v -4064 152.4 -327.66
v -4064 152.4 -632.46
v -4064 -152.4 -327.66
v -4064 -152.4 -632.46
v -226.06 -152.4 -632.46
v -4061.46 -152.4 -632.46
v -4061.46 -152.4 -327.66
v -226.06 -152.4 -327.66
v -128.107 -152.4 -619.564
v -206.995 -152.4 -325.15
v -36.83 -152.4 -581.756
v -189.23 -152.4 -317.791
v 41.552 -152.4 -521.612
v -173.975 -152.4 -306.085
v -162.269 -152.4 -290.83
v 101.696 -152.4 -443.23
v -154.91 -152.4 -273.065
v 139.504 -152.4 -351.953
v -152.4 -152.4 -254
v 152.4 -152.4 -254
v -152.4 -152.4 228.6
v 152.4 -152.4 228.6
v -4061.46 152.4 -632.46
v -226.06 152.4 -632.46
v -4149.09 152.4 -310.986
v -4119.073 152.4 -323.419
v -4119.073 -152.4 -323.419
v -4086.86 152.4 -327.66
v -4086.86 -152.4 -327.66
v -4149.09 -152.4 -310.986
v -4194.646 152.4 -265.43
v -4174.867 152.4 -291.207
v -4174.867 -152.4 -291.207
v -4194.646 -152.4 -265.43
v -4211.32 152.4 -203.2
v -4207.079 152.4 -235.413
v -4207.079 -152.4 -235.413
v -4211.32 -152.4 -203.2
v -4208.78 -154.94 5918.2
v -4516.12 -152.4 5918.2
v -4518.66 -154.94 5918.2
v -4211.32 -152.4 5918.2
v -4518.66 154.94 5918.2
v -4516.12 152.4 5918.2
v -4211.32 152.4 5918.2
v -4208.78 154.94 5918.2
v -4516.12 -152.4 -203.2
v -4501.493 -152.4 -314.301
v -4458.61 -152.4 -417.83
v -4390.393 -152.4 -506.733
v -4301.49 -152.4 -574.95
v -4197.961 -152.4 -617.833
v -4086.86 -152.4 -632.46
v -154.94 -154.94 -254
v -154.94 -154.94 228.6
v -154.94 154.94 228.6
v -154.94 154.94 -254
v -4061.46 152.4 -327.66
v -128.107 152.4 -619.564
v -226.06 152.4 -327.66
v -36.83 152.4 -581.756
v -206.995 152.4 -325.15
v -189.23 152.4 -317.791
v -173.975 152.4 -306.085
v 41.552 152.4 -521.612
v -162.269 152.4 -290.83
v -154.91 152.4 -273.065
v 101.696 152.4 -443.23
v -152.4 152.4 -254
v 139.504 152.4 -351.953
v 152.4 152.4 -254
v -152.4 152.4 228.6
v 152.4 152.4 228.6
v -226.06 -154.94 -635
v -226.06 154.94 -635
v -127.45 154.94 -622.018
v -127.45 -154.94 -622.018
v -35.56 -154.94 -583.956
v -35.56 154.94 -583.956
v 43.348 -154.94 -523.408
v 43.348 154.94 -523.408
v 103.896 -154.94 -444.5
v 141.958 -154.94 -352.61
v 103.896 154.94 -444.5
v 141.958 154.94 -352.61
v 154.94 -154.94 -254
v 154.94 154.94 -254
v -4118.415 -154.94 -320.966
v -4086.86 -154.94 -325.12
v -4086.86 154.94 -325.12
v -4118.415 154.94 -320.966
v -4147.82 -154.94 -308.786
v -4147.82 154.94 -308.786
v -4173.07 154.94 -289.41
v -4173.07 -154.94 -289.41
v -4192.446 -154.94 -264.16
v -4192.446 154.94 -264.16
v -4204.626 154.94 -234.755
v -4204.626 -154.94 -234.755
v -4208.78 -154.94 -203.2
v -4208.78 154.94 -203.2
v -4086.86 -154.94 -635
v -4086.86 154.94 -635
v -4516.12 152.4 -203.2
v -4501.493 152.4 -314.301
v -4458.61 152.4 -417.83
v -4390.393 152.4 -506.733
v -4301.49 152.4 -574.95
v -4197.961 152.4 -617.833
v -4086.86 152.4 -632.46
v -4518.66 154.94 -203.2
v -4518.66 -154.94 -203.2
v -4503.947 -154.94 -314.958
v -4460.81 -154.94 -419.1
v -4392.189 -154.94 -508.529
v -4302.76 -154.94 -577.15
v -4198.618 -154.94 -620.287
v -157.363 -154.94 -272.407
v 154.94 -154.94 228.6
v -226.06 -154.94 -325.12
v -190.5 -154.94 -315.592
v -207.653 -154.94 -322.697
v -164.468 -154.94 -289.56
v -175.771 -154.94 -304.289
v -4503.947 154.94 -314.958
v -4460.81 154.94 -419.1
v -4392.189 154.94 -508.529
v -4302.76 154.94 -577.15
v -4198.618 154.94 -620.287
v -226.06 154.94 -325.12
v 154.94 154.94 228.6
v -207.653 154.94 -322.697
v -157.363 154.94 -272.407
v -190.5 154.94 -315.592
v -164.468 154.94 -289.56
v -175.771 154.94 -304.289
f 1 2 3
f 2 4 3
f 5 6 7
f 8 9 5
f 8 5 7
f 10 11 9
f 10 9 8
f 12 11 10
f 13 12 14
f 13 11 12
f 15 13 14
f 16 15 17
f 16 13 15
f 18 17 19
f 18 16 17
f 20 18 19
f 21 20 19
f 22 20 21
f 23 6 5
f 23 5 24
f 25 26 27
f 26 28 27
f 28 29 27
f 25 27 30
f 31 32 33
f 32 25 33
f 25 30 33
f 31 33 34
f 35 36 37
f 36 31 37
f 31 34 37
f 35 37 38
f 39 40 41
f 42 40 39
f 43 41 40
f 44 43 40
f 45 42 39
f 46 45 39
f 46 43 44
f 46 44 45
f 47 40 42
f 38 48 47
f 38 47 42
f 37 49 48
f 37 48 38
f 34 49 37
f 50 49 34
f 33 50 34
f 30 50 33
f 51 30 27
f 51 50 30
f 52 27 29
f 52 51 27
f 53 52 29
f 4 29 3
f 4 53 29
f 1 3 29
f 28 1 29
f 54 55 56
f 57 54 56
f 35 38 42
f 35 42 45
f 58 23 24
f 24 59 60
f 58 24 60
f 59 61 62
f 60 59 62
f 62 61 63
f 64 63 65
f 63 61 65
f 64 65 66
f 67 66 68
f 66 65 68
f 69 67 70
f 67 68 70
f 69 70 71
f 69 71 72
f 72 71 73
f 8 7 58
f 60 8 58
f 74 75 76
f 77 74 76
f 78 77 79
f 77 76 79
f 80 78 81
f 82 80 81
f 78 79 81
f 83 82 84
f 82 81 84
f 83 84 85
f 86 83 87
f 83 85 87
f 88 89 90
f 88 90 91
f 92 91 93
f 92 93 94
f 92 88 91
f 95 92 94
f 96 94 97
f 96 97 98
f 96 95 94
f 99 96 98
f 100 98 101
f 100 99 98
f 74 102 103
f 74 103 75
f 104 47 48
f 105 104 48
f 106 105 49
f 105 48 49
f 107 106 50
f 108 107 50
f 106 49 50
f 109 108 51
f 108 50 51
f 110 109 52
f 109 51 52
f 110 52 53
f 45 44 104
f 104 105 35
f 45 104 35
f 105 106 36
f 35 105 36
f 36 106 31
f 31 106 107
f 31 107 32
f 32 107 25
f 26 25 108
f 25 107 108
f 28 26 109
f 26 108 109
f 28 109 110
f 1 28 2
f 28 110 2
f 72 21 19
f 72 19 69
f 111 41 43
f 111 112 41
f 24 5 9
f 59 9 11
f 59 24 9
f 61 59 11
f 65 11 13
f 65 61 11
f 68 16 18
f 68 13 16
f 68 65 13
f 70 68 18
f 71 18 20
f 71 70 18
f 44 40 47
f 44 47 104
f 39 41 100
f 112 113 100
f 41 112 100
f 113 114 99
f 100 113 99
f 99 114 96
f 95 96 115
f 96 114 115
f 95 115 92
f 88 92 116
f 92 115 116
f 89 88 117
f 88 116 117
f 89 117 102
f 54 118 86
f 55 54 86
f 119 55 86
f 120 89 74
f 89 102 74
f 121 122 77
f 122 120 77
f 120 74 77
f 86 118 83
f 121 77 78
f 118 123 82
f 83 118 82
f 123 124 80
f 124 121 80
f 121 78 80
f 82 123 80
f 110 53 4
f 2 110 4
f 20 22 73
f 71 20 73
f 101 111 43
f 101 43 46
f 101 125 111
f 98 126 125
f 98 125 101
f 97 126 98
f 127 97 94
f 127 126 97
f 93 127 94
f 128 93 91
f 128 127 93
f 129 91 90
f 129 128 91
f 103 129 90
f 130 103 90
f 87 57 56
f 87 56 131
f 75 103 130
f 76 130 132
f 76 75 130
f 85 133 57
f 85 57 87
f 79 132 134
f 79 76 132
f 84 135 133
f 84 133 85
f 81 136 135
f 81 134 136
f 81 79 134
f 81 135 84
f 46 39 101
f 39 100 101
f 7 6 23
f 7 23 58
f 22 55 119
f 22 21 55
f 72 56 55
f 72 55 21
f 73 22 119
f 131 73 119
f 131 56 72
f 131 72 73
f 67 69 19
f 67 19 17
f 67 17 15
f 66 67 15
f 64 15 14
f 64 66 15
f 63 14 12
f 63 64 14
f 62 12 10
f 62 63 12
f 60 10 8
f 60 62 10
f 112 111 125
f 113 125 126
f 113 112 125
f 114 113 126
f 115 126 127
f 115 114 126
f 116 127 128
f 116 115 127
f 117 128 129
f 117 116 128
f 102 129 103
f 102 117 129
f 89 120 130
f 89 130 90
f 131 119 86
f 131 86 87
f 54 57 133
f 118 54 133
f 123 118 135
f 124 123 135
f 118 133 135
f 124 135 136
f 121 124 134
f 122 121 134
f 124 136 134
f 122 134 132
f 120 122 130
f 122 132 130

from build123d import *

# Parameters (mm, degrees)
SKETCH2_W            = 309.88
SKETCH2_H            = 309.88
SKETCH2_W_2          = 304.8
SKETCH2_H_2          = 304.8
BOSS_EXTRUDE1_DEPTH  = 228.6
BOSS_EXTRUDE6_DEPTH  = 309.88
SHELL1_T             = -2.54
SKETCH9_W            = 304.8
SKETCH9_H            = 304.8
CUT_EXTRUDE2_DEPTH   = 547.442497249
SKETCH10_W           = 309.88
SKETCH10_H           = 309.88
SKETCH10_W_2         = 304.8
SKETCH10_H_2         = 304.8
BOSS_EXTRUDE8_DEPTH  = 3810
BOSS_EXTRUDE9_DEPTH  = 309.88
SHELL2_T             = -2.54
SKETCH12_W           = 309.88
SKETCH12_H           = 309.88
SKETCH12_W_2         = 304.8
SKETCH12_H_2         = 304.8
BOSS_EXTRUDE10_DEPTH = 6096


with BuildPart() as part:
    # Sketch2 → Boss-Extrude1 (new, symmetric)
    with BuildSketch(Plane.XY):
        Rectangle(SKETCH2_W, SKETCH2_H)
        Rectangle(SKETCH2_W_2, SKETCH2_H_2, mode=Mode.SUBTRACT)
    extrude(amount=BOSS_EXTRUDE1_DEPTH, both=True)

    # Sketch8 → Boss-Extrude6 (add)
    with BuildSketch(Plane(origin=(0, 154.94, 0), x_dir=(1, 0, 0), z_dir=(0, 1, 0))):
        with BuildLine():
            Line((154.94, 228.6), (-154.94, 228.6))
            Line((-154.94, 228.6), (-154.94, 254))
            ThreePointArc((-154.94, 254), (-175.770565722, 304.289434278), (-226.06, 325.12))
            Line((-226.06, 325.12), (-251.46, 325.12))
            Line((-251.46, 325.12), (-251.46, 635))
            Line((-251.46, 635), (-226.06, 635))
            ThreePointArc((-226.06, 635), (43.347683632, 523.407683632), (154.94, 254))
            Line((154.94, 254), (154.94, 228.6))
        make_face()
    extrude(amount=-BOSS_EXTRUDE6_DEPTH)

    # Shell1
    shell1_openings = [part.faces().sort_by_distance(p)[0] for p in [
        (-251.46, 0, -480.06),
    ]]
    offset(amount=SHELL1_T, openings=shell1_openings, kind=Kind.INTERSECTION)

    # Sketch9 → Cut-Extrude2 (cut, through all)
    with BuildSketch(Plane(origin=(0, 0, -231.14), x_dir=(-1, 0, 0), z_dir=(0, 0, -1))):
        Rectangle(SKETCH9_W, SKETCH9_H)
    extrude(amount=-CUT_EXTRUDE2_DEPTH, mode=Mode.SUBTRACT)

    # Sketch10 → Boss-Extrude8 (add)
    with BuildSketch(Plane.ZY.offset(251.46)):
        with Locations((-480.06, 0)):
            Rectangle(SKETCH10_W, SKETCH10_H)
        with Locations((-480.06, 0)):
            Rectangle(SKETCH10_W_2, SKETCH10_H_2, mode=Mode.SUBTRACT)
    extrude(amount=BOSS_EXTRUDE8_DEPTH)

    # Sketch11 → Boss-Extrude9 (add)
    with BuildSketch(Plane.XZ.offset(154.94)):
        with BuildLine():
            Line((-4061.46, -325.12), (-4086.86, -325.12))
            ThreePointArc((-4086.86, -325.12), (-4173.070458762, -289.410458762), (-4208.78, -203.2))
            Line((-4208.78, -203.2), (-4208.78, -177.8))
            Line((-4208.78, -177.8), (-4518.66, -177.8))
            Line((-4518.66, -177.8), (-4518.66, -203.2))
            ThreePointArc((-4518.66, -203.2), (-4392.188708116, -508.528708116), (-4086.86, -635))
            Line((-4086.86, -635), (-4061.46, -635))
            Line((-4061.46, -635), (-4061.46, -325.12))
        make_face()
    extrude(amount=-BOSS_EXTRUDE9_DEPTH)

    # Shell2
    shell2_openings = [part.faces().sort_by_distance(p)[0] for p in [
        (-4363.72, 0, -177.8),
    ]]
    offset(amount=SHELL2_T, openings=shell2_openings, kind=Kind.INTERSECTION)

    # Sketch12 → Boss-Extrude10 (add)
    with BuildSketch(Plane.XY.offset(-177.8)):
        with Locations((-4363.72, 0)):
            Rectangle(SKETCH12_W, SKETCH12_H)
        with Locations((-4363.72, 0)):
            Rectangle(SKETCH12_W_2, SKETCH12_H_2, mode=Mode.SUBTRACT)
    extrude(amount=BOSS_EXTRUDE10_DEPTH)


solid = part.part
